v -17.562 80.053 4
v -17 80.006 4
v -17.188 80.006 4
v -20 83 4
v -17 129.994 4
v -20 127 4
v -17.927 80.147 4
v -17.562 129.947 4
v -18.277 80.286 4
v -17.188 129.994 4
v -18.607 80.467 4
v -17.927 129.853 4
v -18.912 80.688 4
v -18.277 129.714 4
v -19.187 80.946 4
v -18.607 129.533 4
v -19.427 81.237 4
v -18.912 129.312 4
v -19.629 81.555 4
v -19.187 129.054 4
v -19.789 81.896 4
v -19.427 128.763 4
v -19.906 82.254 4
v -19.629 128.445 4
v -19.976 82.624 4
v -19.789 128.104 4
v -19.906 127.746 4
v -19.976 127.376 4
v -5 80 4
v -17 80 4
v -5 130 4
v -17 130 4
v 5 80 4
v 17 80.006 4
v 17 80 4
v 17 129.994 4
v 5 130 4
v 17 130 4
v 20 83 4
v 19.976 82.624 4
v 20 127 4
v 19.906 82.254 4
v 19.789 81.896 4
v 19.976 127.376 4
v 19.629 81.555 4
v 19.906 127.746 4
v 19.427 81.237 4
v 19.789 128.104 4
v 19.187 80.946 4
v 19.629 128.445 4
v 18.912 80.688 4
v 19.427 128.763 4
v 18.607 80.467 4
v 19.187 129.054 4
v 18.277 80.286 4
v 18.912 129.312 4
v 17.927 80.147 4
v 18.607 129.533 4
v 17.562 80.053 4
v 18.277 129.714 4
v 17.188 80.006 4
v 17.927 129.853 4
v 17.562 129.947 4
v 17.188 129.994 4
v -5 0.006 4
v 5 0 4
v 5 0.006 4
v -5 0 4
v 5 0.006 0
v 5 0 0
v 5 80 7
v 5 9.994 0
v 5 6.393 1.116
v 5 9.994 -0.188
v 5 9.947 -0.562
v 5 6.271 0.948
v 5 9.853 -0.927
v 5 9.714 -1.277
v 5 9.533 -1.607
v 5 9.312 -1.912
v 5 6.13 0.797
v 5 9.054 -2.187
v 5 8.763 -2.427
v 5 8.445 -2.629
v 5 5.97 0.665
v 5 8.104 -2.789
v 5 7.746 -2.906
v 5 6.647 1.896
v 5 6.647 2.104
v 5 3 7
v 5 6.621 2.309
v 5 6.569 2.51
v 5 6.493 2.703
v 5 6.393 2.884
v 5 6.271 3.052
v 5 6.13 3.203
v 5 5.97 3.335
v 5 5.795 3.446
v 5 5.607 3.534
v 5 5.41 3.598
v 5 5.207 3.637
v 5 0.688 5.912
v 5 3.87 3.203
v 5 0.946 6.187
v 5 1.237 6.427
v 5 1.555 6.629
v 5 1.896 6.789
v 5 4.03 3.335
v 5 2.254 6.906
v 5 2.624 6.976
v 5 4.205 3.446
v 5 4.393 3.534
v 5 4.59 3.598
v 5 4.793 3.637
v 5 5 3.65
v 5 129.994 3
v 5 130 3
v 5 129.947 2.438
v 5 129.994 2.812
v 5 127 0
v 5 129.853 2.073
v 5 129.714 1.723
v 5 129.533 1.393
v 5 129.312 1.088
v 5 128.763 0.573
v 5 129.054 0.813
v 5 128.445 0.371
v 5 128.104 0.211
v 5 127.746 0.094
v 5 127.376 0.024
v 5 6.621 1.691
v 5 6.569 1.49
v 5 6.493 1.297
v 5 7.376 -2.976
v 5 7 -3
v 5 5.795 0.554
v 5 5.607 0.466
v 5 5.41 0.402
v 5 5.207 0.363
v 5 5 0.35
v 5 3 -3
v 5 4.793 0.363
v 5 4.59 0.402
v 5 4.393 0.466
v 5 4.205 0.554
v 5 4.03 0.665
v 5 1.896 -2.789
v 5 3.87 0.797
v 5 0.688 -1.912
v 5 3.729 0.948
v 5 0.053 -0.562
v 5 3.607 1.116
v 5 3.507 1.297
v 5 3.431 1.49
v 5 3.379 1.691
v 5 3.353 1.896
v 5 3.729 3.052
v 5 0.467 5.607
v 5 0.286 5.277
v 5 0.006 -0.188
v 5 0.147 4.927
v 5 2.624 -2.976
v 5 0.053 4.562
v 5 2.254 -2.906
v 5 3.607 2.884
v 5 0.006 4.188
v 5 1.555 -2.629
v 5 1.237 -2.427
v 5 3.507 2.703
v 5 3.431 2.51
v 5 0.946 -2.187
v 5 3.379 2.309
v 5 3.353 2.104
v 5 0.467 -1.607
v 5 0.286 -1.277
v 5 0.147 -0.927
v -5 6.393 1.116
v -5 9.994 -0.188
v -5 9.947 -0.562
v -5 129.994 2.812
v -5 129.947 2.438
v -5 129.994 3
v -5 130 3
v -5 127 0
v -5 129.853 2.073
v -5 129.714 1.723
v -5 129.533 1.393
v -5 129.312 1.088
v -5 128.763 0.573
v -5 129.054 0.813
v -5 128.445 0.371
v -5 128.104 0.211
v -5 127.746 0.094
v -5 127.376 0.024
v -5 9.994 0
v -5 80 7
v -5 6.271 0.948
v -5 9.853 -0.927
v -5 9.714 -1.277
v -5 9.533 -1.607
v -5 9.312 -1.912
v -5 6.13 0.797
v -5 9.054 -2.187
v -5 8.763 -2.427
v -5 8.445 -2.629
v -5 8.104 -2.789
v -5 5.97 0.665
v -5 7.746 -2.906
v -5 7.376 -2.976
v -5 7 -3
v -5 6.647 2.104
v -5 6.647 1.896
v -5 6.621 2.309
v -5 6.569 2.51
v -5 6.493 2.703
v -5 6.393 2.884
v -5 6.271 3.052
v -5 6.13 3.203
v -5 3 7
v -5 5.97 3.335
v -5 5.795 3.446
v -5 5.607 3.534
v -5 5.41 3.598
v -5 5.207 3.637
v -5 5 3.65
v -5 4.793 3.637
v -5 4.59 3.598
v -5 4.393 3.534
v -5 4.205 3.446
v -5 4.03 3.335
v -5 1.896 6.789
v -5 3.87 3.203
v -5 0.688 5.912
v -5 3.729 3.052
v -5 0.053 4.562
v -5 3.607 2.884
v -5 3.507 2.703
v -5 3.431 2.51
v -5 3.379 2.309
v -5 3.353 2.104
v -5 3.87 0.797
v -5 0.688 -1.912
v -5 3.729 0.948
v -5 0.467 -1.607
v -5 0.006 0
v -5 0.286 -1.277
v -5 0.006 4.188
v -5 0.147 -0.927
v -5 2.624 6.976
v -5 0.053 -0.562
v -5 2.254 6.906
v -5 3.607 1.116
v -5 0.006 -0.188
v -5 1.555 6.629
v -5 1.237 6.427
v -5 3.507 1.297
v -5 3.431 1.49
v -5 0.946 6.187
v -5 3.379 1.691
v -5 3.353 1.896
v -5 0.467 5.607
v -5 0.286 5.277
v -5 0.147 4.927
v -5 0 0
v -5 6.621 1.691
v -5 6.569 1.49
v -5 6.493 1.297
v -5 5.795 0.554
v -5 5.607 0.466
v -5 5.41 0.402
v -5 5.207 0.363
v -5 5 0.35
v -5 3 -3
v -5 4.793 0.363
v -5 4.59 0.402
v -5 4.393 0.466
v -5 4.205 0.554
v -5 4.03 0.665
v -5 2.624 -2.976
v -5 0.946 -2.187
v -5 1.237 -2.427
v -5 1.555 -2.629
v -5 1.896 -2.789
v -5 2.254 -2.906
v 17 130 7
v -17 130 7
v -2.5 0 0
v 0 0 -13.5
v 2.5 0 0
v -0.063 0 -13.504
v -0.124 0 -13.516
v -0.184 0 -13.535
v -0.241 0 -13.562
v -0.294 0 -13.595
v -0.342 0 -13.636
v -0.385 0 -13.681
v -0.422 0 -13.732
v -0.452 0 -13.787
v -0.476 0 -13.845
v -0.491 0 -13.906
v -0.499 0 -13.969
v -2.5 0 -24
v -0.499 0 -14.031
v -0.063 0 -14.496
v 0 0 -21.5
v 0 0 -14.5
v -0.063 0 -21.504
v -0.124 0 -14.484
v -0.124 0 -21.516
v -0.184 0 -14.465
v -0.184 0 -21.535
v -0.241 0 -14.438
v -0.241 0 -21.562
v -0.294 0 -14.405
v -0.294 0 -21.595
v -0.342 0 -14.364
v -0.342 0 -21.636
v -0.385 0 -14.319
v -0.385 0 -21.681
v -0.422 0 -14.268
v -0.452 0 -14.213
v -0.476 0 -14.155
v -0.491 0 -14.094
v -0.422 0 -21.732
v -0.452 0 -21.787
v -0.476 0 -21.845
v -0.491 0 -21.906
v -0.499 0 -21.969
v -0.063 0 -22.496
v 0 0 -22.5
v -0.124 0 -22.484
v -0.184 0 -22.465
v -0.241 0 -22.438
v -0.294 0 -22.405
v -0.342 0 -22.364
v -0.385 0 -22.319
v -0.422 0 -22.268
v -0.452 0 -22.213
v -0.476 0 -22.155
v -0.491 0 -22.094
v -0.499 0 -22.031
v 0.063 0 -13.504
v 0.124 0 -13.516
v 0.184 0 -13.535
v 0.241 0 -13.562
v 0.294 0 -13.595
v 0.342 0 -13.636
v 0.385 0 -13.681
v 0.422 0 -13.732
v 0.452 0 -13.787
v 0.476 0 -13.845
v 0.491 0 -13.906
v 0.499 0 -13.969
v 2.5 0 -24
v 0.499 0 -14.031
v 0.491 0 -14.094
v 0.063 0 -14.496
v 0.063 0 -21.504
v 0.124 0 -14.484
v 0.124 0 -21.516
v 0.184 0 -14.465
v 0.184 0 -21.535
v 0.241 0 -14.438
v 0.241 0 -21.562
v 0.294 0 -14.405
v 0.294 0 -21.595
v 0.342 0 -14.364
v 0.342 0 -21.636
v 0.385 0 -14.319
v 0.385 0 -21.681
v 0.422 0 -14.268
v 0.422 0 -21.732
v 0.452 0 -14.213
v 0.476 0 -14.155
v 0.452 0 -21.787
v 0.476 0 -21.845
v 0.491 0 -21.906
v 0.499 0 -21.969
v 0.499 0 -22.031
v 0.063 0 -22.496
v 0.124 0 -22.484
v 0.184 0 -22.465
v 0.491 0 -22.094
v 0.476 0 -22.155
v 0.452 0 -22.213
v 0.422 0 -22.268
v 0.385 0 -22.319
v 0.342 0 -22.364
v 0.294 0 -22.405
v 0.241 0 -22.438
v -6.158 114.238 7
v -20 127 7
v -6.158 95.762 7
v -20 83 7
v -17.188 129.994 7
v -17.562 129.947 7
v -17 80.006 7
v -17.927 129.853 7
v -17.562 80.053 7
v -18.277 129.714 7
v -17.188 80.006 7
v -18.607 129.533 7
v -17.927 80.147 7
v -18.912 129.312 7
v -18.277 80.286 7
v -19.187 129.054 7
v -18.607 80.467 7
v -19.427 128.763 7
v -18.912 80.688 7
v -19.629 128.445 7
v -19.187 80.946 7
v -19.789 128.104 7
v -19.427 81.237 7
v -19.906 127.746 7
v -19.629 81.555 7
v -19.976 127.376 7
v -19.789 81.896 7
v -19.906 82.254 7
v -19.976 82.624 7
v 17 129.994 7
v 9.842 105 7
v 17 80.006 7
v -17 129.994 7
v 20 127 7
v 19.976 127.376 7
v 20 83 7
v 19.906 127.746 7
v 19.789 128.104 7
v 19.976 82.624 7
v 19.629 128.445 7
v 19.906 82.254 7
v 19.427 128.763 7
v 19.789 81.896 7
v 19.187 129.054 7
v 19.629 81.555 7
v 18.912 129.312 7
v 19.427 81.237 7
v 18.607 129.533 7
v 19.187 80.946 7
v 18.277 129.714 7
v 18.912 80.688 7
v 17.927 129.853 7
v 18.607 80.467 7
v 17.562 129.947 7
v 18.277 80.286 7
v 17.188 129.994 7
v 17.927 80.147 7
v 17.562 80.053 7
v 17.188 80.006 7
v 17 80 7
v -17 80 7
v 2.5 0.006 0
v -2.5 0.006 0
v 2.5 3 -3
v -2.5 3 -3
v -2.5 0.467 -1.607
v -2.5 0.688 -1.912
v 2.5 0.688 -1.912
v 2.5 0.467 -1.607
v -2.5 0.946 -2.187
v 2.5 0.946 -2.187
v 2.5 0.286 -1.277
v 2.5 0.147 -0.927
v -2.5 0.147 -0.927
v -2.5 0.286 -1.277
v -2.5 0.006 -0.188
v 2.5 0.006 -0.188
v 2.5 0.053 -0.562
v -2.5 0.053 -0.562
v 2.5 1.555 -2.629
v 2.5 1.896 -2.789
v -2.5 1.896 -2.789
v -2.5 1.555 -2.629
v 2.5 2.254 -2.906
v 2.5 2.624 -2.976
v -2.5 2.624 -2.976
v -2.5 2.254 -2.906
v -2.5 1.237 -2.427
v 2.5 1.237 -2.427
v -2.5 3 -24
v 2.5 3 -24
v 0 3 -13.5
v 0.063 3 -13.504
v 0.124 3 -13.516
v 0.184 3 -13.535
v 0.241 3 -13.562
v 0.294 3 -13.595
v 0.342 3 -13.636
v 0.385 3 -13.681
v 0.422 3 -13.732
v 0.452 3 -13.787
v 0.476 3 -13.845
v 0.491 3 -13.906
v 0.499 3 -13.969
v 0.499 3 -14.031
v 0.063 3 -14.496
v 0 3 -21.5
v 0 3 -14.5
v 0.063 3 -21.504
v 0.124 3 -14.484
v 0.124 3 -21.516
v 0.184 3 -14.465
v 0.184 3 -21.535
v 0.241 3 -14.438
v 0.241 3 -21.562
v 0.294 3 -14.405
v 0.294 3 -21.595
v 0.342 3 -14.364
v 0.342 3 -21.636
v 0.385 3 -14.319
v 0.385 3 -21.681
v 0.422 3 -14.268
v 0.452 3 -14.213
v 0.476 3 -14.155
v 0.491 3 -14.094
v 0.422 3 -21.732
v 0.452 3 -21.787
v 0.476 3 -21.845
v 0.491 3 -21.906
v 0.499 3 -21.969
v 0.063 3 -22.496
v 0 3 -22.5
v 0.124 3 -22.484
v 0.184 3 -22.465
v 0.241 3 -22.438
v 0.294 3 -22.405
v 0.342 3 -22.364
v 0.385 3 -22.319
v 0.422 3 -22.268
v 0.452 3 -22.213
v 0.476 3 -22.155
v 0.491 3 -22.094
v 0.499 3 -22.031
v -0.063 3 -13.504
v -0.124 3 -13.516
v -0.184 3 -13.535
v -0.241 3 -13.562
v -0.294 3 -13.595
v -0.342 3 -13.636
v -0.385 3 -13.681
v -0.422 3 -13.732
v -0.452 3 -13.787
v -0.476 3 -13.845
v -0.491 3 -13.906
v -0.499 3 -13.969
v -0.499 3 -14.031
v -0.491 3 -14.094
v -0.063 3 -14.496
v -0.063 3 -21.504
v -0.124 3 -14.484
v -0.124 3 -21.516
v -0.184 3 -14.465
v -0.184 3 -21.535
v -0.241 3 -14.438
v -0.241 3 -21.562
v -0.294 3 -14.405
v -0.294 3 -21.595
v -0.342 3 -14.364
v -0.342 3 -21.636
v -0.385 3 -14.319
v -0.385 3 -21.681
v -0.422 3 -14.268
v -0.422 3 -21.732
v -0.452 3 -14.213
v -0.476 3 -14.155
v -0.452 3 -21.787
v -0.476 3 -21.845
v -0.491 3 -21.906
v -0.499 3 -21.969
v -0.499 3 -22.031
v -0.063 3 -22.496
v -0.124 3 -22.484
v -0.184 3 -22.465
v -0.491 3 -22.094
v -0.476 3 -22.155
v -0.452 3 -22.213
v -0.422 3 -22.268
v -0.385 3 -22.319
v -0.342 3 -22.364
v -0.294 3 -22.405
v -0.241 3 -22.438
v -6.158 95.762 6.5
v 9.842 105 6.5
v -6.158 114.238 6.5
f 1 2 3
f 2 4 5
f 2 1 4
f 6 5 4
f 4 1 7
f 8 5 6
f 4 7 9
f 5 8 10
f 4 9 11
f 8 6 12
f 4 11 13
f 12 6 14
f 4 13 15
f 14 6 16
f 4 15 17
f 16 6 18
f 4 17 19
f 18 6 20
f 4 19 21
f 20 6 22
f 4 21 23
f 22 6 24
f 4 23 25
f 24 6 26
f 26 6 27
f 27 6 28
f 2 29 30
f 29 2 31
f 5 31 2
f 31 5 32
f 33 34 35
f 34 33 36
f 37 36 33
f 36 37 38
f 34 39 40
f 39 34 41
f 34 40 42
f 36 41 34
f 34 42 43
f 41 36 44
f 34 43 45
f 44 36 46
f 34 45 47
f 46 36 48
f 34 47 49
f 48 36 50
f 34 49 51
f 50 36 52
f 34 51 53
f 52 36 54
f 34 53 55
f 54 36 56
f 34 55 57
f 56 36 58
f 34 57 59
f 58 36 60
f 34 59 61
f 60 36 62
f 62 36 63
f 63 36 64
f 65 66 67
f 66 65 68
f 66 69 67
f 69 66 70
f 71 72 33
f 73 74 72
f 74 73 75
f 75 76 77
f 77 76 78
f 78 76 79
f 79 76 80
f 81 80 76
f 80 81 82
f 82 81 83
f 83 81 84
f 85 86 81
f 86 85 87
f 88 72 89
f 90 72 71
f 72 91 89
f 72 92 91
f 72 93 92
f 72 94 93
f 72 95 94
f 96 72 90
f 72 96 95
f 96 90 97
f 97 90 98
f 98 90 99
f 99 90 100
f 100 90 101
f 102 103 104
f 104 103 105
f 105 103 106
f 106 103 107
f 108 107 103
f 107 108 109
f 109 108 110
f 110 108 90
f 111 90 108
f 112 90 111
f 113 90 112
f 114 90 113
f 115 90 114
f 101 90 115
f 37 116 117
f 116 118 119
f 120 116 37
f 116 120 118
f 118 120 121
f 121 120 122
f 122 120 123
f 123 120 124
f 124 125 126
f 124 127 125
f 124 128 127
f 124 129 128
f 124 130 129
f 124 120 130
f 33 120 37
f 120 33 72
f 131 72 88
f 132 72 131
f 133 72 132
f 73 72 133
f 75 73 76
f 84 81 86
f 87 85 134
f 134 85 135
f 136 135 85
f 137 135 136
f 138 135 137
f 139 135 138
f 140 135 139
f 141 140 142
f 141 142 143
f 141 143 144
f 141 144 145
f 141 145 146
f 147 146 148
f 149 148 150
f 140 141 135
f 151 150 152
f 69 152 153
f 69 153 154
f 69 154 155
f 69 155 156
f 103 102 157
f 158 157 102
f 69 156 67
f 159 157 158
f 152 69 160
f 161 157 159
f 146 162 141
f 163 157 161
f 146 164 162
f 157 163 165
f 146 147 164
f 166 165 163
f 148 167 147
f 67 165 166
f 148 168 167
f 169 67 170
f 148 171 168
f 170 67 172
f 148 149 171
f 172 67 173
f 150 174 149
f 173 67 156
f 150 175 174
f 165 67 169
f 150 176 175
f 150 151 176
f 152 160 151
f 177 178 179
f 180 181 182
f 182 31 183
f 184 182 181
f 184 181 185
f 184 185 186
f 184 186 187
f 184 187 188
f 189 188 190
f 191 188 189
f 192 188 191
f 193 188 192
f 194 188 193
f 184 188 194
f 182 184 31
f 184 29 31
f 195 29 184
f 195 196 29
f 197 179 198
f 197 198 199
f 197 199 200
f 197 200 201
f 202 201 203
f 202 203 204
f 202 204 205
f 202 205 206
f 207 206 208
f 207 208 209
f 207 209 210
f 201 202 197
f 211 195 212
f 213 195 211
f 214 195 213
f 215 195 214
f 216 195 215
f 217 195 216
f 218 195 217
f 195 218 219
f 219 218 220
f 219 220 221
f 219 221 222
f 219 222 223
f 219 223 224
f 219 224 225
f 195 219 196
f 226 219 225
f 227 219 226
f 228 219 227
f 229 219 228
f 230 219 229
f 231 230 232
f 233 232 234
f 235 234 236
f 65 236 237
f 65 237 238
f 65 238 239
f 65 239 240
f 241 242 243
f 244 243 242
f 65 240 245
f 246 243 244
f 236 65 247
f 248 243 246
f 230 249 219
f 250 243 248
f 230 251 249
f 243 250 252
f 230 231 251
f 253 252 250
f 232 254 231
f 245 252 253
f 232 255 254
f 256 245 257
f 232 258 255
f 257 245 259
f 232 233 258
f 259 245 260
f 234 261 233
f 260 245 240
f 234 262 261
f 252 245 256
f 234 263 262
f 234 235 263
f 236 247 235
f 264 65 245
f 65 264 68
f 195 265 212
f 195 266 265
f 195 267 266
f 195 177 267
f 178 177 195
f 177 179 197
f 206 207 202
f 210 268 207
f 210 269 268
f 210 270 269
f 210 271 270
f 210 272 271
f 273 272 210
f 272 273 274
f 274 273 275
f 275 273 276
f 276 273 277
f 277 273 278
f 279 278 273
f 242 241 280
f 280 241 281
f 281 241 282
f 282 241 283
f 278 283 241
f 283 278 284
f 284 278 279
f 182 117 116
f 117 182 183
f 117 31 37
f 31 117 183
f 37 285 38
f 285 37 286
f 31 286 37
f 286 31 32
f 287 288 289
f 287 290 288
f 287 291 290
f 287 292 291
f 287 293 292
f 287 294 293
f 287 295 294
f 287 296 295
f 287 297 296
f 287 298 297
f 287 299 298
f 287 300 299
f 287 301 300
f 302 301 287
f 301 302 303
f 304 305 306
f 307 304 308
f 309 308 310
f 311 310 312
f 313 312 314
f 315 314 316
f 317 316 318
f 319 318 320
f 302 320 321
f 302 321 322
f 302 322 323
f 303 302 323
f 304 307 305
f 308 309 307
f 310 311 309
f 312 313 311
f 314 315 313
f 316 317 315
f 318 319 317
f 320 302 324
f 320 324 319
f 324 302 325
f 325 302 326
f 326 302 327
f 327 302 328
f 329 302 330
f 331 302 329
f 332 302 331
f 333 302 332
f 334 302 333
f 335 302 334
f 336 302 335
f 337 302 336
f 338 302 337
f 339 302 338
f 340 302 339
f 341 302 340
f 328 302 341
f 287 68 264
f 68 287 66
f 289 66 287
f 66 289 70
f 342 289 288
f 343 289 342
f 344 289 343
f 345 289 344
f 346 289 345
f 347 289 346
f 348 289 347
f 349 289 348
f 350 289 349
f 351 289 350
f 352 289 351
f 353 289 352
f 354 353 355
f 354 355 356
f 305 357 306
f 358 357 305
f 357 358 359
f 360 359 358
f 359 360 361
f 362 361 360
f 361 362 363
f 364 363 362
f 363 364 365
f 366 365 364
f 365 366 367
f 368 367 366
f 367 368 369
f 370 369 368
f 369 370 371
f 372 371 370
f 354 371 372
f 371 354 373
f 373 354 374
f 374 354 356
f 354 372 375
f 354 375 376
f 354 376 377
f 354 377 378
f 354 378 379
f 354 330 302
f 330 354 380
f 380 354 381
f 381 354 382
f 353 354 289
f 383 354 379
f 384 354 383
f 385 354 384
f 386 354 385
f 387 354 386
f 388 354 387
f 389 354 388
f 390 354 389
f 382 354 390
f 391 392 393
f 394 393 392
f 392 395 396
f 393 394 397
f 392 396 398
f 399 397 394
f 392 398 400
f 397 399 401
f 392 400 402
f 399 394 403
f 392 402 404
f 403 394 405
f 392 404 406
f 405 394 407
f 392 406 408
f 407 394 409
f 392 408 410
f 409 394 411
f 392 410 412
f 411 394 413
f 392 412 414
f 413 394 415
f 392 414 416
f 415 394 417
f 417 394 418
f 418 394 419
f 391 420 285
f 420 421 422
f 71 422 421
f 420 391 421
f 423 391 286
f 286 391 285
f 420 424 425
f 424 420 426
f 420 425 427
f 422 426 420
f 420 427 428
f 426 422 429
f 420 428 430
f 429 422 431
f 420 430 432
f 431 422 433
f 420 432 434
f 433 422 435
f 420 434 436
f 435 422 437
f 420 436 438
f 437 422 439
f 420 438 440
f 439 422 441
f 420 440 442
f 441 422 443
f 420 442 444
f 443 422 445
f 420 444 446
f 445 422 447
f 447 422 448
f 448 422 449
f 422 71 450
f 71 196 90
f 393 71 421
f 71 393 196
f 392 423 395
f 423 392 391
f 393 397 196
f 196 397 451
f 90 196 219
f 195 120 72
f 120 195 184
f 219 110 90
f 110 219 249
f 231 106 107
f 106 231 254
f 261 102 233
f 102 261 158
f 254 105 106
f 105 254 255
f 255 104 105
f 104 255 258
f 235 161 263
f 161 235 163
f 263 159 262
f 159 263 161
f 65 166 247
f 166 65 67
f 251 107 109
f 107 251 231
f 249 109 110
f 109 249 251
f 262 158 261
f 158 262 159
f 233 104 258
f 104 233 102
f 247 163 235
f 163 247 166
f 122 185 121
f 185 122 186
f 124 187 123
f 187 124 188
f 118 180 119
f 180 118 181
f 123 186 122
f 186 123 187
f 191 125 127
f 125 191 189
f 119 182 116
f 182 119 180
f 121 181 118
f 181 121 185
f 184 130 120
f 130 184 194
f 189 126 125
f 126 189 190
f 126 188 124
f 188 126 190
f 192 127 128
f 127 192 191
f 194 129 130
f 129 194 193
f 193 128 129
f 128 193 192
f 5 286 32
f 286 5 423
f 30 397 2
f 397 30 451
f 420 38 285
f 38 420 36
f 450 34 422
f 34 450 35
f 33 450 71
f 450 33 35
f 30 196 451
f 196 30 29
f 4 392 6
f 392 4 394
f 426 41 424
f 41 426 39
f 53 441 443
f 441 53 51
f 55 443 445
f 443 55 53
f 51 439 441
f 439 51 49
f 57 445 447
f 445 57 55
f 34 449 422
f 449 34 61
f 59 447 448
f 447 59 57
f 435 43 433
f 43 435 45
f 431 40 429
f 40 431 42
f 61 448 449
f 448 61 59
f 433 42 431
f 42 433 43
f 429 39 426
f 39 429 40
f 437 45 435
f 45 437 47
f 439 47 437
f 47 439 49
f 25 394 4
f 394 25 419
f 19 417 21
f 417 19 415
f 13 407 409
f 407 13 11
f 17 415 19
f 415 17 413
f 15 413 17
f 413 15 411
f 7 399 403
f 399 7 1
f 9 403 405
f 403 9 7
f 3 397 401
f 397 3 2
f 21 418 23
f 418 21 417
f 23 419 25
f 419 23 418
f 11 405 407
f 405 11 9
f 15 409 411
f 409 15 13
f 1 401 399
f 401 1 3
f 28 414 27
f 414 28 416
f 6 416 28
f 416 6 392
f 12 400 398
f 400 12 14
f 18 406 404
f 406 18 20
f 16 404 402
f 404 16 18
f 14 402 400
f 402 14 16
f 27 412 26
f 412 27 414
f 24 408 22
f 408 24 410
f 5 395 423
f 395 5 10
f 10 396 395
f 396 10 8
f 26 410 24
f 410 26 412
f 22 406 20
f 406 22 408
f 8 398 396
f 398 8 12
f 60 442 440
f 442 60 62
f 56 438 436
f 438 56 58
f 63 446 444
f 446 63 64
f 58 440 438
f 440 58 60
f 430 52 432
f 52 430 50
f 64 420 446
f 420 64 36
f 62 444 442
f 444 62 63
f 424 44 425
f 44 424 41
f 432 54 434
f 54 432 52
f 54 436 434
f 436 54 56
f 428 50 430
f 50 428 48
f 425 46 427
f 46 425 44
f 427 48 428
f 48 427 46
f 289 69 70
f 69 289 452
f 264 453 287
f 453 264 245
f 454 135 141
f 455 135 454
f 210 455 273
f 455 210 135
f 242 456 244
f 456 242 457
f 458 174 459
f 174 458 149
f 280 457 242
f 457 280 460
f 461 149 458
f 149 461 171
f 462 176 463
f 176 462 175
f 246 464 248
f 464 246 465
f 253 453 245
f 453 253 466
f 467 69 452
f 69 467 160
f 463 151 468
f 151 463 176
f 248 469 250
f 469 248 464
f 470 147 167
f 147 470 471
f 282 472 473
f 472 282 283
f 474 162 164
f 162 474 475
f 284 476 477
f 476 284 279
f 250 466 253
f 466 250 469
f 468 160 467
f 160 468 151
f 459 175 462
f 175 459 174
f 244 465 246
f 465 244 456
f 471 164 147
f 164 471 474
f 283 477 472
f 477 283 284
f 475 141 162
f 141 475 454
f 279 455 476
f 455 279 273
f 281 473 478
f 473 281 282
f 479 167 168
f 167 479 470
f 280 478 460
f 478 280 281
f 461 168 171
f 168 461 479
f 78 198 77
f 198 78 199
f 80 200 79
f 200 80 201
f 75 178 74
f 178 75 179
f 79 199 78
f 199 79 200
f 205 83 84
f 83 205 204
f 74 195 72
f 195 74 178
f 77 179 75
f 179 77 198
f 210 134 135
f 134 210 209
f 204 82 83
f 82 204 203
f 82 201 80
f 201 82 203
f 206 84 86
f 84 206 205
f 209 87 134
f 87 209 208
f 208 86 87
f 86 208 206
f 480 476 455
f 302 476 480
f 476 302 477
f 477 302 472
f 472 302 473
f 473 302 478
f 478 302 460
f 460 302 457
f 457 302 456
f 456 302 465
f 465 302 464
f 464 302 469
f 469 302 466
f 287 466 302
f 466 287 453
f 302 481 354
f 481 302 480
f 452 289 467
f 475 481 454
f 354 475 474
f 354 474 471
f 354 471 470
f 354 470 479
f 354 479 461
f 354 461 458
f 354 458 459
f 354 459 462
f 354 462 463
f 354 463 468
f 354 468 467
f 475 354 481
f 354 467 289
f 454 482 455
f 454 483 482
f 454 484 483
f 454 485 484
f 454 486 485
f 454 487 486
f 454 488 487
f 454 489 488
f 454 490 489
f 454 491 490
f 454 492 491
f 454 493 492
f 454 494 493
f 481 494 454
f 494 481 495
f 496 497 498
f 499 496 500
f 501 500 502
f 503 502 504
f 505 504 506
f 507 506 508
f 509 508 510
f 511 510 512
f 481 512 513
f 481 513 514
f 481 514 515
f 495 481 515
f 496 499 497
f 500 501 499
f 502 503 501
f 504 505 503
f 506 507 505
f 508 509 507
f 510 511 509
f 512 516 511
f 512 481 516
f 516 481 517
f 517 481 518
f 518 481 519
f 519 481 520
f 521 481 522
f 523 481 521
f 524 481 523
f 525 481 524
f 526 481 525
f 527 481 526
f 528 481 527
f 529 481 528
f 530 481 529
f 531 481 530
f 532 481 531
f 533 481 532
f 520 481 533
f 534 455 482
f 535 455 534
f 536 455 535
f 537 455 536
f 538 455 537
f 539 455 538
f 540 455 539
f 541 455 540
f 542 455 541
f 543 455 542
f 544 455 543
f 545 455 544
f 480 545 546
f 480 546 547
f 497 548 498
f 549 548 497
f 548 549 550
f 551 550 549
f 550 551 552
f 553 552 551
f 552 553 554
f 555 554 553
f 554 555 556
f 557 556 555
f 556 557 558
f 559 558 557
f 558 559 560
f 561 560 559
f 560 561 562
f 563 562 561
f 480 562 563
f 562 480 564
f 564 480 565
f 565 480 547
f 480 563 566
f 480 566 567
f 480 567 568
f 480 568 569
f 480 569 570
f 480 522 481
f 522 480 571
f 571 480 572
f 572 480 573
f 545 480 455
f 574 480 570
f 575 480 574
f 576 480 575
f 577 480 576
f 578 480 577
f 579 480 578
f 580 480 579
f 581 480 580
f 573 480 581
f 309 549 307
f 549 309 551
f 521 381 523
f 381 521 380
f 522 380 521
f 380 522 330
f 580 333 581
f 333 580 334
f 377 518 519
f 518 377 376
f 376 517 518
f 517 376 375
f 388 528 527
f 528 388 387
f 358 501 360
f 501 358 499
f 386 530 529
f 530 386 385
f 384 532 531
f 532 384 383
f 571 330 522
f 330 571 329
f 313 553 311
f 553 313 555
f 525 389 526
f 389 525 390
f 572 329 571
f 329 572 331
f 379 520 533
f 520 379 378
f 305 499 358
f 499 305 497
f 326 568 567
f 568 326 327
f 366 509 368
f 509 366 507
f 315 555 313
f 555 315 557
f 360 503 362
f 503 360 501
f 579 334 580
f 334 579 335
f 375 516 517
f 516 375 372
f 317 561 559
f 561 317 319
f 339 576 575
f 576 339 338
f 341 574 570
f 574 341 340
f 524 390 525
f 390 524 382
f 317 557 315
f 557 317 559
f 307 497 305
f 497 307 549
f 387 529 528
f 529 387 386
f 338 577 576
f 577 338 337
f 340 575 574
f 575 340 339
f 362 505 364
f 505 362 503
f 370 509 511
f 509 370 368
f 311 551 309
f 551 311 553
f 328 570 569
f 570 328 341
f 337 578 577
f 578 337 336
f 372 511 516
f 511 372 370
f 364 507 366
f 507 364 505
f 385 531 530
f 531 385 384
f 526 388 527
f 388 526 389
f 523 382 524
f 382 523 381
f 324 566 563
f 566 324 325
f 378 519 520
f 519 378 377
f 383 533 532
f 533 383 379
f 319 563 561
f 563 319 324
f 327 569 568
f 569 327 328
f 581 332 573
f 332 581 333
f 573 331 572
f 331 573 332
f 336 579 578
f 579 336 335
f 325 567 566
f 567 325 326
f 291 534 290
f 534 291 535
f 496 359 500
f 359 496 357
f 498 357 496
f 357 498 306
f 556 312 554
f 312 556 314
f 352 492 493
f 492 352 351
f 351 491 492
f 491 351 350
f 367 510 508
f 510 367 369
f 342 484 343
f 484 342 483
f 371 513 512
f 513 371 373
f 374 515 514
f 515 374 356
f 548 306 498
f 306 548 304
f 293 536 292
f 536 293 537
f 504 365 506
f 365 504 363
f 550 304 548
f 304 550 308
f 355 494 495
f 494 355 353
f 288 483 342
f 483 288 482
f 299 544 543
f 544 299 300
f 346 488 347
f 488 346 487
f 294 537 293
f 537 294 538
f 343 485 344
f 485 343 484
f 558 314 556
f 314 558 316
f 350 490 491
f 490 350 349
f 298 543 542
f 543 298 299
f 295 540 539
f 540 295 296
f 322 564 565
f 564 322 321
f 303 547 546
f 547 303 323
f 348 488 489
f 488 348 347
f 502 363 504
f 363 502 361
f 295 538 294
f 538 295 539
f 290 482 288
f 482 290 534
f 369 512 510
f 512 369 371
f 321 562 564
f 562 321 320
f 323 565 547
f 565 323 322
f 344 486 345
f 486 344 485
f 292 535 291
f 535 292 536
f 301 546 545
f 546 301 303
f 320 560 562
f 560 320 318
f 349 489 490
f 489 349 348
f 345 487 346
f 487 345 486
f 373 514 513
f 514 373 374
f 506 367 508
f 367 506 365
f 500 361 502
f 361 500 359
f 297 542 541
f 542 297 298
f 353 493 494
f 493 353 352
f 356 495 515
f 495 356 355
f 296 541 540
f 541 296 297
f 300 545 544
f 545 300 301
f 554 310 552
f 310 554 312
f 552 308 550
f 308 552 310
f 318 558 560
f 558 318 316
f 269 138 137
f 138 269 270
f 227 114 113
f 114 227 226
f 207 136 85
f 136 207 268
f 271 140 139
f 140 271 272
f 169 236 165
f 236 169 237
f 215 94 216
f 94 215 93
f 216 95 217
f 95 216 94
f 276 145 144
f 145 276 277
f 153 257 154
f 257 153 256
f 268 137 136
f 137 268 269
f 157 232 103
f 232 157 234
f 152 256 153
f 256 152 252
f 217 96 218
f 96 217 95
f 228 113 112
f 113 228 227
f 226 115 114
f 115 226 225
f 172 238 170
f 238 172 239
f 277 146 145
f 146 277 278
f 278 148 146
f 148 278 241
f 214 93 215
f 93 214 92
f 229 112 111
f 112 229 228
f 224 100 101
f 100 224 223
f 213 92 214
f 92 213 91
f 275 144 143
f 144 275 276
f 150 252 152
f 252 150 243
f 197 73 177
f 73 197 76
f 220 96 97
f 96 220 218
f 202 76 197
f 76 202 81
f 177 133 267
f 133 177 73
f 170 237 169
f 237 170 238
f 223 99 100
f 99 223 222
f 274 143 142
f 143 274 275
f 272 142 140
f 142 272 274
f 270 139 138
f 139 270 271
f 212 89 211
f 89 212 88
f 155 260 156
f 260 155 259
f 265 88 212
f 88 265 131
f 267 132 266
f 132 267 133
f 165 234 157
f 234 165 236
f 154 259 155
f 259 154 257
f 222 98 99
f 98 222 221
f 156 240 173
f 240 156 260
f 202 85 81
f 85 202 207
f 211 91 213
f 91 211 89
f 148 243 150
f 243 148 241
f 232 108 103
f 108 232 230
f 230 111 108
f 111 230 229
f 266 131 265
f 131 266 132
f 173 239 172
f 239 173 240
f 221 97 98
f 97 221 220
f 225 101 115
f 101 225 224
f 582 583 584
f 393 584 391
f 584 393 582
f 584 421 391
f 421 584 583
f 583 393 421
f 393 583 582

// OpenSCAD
// file: lib.scad
module boxWithRoundedCorners(width, depth, height, cornerRadius) {
    innerWidth = width - cornerRadius * 2;
    innerDepth = depth - cornerRadius * 2;
    
    translate([cornerRadius, 0, 0])
    cube([innerWidth, depth, height]);
    translate([0, cornerRadius, 0])
    cube([width, innerDepth, height]);
    
    translate([cornerRadius, cornerRadius, 0])
    cylinder(h=height, r=cornerRadius);
    translate([width - cornerRadius, cornerRadius, 0])
    cylinder(h=height, r=cornerRadius);
    translate([width - cornerRadius, depth - cornerRadius, 0])
    cylinder(h=height, r=cornerRadius);
    translate([cornerRadius, depth - cornerRadius, 0])
    cylinder(h=height, r=cornerRadius);
}


module eqTriangle(width, height) {    
    triangle_points = [
        [0, 0],  // Point A
        [width, width * sqrt(4/3) / 2], // Point B
        [0, width * sqrt(4/3)]  // Point C
    ];

    linear_extrude(height = height) {
        polygon(points = triangle_points);
    }
}






// Max compres % = (depth - 2 * segmentThickness * segments) / depth
module spring(width, depth, height, segments, segmentThickness) {
    depthPerSegment = depth / segments;
    
    for (i = [0:1:segments - 1]) 
    {
        translate([0, i * depthPerSegment, 0]) {
            cube([width, segmentThickness, height]);
            cube([segmentThickness, depthPerSegment / 2, height]);
            translate([0, depthPerSegment / 2, 0])
            cube([width, segmentThickness, height]);    
            translate([width - segmentThickness, depthPerSegment / 2, 0])    
            cube([segmentThickness, depthPerSegment / 2, height]);
        }
    }
}
// main file
include <lib.scad>
$fn = 50;


screwRadiusM3 = 1.45; // The M3x10mm screws



// PEDAL
pedalLength = 130; // 50
pedalWidth = 10;
pedalStickHeight = 7;

pedalConnHeight = 10;
pedalConnLength = 10;
pedalConnHoleRad = screwRadiusM3 + .2;


// PEDALHOLDER


pedalFeetLength = 50;
pedalFeetHeight = 3;
pedalFeetWidth = 40;


pedalHolderWallThickness = 3;
pedalMargin = .1;
pedalHolderConnHeight = 27;
pedalHolderWidth = pedalWidth + 2 * (pedalHolderWallThickness + pedalMargin);
pedalHolderLength = 17;
pedalHolderHeight = 32;



pedalOffset = 80;
footPadding = 10;
footDepth = pedalLength + footPadding * 2;
footGroundHeight = 3;
footWidth = pedalHolderWidth + footPadding * 2 + pedalOffset;

pedalSpringOffset = 50;



metalWireHeight = 5;
metalWireOffset = 2;
metalWireRadius = .5;


// PEDAL SPRING
springDepth = 10;
springThickness = 2;

//
////translate([-pedalOffset/2, 
////    -pedalConnLength / 2 + pedalHolderWallThickness + pedalConnLength * 2/3, pedalHolderConnHeight + footGroundHeight + -(pedalStickHeight - pedalConnHeight / 2)
////]) {
////    rotate([-5, 0, 0]) {
////        pedal();
////        translate([pedalOffset, 0, 0])
////        backPedal();
////    }
//}
//
//translate([-footWidth/2, -footPadding, 0])
//pedalHolder();

//translate([0, pedalSpringOffset, footGroundHeight-springThickness])
//pedalSpring();

backPedal();


module pedalSpring() {
    translate([pedalWidth / 2, springDepth, 0])
    rotate([90, 0, -90])
    union() {
        translate([0, pedalHolderConnHeight, 0])
        rotate([0, 0, 180])
        spring(springDepth, pedalHolderConnHeight - springThickness, pedalWidth, 2, springThickness);

        translate([-springDepth * 2, 0, 0])
        cube([springDepth * 3, springThickness, pedalWidth]);
    }
}
    


module pedalHolder() {
    difference() {
        boxWithRoundedCorners(footWidth, footDepth, footGroundHeight, 3);
        singlePedal();
        translate([pedalOffset, 0, 0])
        singlePedal();
    }
    difference() {
        union() {
            singlePedal();
            translate([pedalOffset, 0, 0])
            singlePedal();
        }
        boxWithRoundedCorners(footWidth, footDepth, footGroundHeight, 3);
    }
    
    
    // CABLE GUIDER
    cableGuiderHoleRad = 2;
    guiderSize = 7;

    translate([footWidth/2, 3, 0])
    rotate([90, 0, 0])
    difference() 
    {
        translate([-guiderSize/2, 0, 0])
        boxWithRoundedCorners(guiderSize, 8, 3, 2);
        translate([0, footGroundHeight+cableGuiderHoleRad, 0])
        cylinder(3, r=cableGuiderHoleRad);
    }
}


module singlePedal() {
    translate([
        footPadding + pedalHolderWallThickness + pedalMargin, 
        footPadding + pedalSpringOffset, 
        footGroundHeight-springThickness
    ])        
    cube([pedalWidth, springDepth * 3, springThickness]);
        

    translate([footPadding, footPadding, footGroundHeight]) {
        difference() {
            cube([pedalHolderWidth, pedalLength, pedalHolderHeight]);
            translate([pedalHolderWallThickness, 0, 0])
            cube([pedalWidth + 2 * pedalMargin, pedalLength, pedalHolderHeight]);

            translate([0, pedalHolderWallThickness + pedalConnLength * 2/3, pedalHolderConnHeight])
            rotate([0, 90, 0])
            cylinder(pedalHolderWidth, r=screwRadiusM3);
            
            
            translate([0, metalWireOffset, metalWireHeight])
            rotate([0, 90, 0])
            cylinder(pedalHolderWidth, r=metalWireRadius);
            
            translate([0, metalWireOffset + 10, metalWireHeight])
            rotate([0, 90, 0])
            cylinder(pedalHolderWidth, r=metalWireRadius);
            
            angle = 16;
            translate([0, pedalHolderLength + pedalHolderHeight/tan(angle), 0])
            rotate([90 - angle, 0, 0])
            translate([0, 0, -50])
            cube([pedalHolderWidth, 200, 500]);
        }
    }
}
    
module backPedal() {
    mirror([1, 0, 0])
    pedal();
}
module pedal() {
    difference() 
    {
        union() {
            // Pedal Stick
            translate([pedalWidth/2, 0, 0])
            rotate([0, -90, 0])
            boxWithRoundedCorners(pedalStickHeight, pedalLength, pedalWidth, 3);
            
            // Pedal feet
            translate([-pedalFeetWidth / 2, pedalLength - pedalFeetLength, pedalStickHeight - pedalFeetHeight]) {
                boxWithRoundedCorners(pedalFeetWidth, pedalFeetLength, pedalFeetHeight, 3);
            }
            
            
            // Conn point
            translate([pedalWidth/2, 0, pedalStickHeight - pedalConnHeight])
            rotate([0, -90, 0])
            boxWithRoundedCorners(pedalConnHeight, pedalConnLength, pedalWidth, 3);
            
            wireBeamWidth = 5;
            wireBeamHeight = pedalHolderConnHeight - 3;
            translate([-pedalWidth/2 + wireBeamWidth/2, 0, -(wireBeamHeight)])
            difference() {
                cube([wireBeamWidth, 3, wireBeamHeight]);
                
                translate([wireBeamWidth/2, 0, 2])
                rotate([0, 90, 90])
                cylinder(pedalHolderWidth, r=metalWireRadius);
                translate([wireBeamWidth/2, 0, 10])
                rotate([0, 90, 90])
                cylinder(pedalHolderWidth, r=metalWireRadius);
            }
        }
        
        translate([-pedalWidth/2, pedalConnLength / 2, pedalStickHeight - pedalConnHeight / 2])
        rotate([0, 90, 0])
        cylinder(pedalWidth, r=pedalConnHoleRad);
        
        // Icon cutout
        width = pedalFeetWidth * .4;
        iconDepth = .5;
        translate([
            width * sqrt(4/3) / 3, 
            pedalLength - pedalFeetLength/2 + width * sqrt(4/3) / 2, 
            pedalStickHeight - iconDepth
        ])
        rotate([0, 0, 180])
        eqTriangle(width, iconDepth  *2);
       
   }
}



    
//module pedal() {
//    difference() 
//    {
//        union() {
//            // Pedal Stick
//            translate([pedalWidth/2, 0, 0])
//            rotate([0, -90, 0])
//            boxWithRoundedCorners(pedalStickHeight, pedalLength, pedalWidth, 3);
//            
//            // Pedal feet
//            translate([-pedalFeetWidth / 2, pedalLength - pedalFeetLength, pedalStickHeight - pedalFeetHeight]) {
//                boxWithRoundedCorners(pedalFeetWidth, pedalFeetLength, pedalFeetHeight, 3);
//            }
//            
//            
//            // Conn point
//            translate([pedalWidth/2, 0, pedalStickHeight - pedalConnHeight])
//            rotate([0, -90, 0])
//            boxWithRoundedCorners(pedalConnHeight, pedalConnLength, pedalWidth, pedalConnLength/2);
//        }
//        
//        translate([-pedalWidth/2, pedalConnLength / 2, pedalStickHeight - pedalConnHeight / 2])
//        rotate([0, 90, 0])
//        cylinder(pedalWidth, r=pedalConnHoleRad);
//        
//        // Icon cutout
//        width = pedalFeetWidth * .4;
//        iconDepth = .5;
//        translate([width * sqrt(4/3) / 3, pedalLength - pedalFeetLength/2 + width * sqrt(4/3) / 2, pedalStickHeight - iconDepth])
//        rotate([0, 0, 180])
//        eqTriangle(width, iconDepth  *2);
//        
//    }
//}
